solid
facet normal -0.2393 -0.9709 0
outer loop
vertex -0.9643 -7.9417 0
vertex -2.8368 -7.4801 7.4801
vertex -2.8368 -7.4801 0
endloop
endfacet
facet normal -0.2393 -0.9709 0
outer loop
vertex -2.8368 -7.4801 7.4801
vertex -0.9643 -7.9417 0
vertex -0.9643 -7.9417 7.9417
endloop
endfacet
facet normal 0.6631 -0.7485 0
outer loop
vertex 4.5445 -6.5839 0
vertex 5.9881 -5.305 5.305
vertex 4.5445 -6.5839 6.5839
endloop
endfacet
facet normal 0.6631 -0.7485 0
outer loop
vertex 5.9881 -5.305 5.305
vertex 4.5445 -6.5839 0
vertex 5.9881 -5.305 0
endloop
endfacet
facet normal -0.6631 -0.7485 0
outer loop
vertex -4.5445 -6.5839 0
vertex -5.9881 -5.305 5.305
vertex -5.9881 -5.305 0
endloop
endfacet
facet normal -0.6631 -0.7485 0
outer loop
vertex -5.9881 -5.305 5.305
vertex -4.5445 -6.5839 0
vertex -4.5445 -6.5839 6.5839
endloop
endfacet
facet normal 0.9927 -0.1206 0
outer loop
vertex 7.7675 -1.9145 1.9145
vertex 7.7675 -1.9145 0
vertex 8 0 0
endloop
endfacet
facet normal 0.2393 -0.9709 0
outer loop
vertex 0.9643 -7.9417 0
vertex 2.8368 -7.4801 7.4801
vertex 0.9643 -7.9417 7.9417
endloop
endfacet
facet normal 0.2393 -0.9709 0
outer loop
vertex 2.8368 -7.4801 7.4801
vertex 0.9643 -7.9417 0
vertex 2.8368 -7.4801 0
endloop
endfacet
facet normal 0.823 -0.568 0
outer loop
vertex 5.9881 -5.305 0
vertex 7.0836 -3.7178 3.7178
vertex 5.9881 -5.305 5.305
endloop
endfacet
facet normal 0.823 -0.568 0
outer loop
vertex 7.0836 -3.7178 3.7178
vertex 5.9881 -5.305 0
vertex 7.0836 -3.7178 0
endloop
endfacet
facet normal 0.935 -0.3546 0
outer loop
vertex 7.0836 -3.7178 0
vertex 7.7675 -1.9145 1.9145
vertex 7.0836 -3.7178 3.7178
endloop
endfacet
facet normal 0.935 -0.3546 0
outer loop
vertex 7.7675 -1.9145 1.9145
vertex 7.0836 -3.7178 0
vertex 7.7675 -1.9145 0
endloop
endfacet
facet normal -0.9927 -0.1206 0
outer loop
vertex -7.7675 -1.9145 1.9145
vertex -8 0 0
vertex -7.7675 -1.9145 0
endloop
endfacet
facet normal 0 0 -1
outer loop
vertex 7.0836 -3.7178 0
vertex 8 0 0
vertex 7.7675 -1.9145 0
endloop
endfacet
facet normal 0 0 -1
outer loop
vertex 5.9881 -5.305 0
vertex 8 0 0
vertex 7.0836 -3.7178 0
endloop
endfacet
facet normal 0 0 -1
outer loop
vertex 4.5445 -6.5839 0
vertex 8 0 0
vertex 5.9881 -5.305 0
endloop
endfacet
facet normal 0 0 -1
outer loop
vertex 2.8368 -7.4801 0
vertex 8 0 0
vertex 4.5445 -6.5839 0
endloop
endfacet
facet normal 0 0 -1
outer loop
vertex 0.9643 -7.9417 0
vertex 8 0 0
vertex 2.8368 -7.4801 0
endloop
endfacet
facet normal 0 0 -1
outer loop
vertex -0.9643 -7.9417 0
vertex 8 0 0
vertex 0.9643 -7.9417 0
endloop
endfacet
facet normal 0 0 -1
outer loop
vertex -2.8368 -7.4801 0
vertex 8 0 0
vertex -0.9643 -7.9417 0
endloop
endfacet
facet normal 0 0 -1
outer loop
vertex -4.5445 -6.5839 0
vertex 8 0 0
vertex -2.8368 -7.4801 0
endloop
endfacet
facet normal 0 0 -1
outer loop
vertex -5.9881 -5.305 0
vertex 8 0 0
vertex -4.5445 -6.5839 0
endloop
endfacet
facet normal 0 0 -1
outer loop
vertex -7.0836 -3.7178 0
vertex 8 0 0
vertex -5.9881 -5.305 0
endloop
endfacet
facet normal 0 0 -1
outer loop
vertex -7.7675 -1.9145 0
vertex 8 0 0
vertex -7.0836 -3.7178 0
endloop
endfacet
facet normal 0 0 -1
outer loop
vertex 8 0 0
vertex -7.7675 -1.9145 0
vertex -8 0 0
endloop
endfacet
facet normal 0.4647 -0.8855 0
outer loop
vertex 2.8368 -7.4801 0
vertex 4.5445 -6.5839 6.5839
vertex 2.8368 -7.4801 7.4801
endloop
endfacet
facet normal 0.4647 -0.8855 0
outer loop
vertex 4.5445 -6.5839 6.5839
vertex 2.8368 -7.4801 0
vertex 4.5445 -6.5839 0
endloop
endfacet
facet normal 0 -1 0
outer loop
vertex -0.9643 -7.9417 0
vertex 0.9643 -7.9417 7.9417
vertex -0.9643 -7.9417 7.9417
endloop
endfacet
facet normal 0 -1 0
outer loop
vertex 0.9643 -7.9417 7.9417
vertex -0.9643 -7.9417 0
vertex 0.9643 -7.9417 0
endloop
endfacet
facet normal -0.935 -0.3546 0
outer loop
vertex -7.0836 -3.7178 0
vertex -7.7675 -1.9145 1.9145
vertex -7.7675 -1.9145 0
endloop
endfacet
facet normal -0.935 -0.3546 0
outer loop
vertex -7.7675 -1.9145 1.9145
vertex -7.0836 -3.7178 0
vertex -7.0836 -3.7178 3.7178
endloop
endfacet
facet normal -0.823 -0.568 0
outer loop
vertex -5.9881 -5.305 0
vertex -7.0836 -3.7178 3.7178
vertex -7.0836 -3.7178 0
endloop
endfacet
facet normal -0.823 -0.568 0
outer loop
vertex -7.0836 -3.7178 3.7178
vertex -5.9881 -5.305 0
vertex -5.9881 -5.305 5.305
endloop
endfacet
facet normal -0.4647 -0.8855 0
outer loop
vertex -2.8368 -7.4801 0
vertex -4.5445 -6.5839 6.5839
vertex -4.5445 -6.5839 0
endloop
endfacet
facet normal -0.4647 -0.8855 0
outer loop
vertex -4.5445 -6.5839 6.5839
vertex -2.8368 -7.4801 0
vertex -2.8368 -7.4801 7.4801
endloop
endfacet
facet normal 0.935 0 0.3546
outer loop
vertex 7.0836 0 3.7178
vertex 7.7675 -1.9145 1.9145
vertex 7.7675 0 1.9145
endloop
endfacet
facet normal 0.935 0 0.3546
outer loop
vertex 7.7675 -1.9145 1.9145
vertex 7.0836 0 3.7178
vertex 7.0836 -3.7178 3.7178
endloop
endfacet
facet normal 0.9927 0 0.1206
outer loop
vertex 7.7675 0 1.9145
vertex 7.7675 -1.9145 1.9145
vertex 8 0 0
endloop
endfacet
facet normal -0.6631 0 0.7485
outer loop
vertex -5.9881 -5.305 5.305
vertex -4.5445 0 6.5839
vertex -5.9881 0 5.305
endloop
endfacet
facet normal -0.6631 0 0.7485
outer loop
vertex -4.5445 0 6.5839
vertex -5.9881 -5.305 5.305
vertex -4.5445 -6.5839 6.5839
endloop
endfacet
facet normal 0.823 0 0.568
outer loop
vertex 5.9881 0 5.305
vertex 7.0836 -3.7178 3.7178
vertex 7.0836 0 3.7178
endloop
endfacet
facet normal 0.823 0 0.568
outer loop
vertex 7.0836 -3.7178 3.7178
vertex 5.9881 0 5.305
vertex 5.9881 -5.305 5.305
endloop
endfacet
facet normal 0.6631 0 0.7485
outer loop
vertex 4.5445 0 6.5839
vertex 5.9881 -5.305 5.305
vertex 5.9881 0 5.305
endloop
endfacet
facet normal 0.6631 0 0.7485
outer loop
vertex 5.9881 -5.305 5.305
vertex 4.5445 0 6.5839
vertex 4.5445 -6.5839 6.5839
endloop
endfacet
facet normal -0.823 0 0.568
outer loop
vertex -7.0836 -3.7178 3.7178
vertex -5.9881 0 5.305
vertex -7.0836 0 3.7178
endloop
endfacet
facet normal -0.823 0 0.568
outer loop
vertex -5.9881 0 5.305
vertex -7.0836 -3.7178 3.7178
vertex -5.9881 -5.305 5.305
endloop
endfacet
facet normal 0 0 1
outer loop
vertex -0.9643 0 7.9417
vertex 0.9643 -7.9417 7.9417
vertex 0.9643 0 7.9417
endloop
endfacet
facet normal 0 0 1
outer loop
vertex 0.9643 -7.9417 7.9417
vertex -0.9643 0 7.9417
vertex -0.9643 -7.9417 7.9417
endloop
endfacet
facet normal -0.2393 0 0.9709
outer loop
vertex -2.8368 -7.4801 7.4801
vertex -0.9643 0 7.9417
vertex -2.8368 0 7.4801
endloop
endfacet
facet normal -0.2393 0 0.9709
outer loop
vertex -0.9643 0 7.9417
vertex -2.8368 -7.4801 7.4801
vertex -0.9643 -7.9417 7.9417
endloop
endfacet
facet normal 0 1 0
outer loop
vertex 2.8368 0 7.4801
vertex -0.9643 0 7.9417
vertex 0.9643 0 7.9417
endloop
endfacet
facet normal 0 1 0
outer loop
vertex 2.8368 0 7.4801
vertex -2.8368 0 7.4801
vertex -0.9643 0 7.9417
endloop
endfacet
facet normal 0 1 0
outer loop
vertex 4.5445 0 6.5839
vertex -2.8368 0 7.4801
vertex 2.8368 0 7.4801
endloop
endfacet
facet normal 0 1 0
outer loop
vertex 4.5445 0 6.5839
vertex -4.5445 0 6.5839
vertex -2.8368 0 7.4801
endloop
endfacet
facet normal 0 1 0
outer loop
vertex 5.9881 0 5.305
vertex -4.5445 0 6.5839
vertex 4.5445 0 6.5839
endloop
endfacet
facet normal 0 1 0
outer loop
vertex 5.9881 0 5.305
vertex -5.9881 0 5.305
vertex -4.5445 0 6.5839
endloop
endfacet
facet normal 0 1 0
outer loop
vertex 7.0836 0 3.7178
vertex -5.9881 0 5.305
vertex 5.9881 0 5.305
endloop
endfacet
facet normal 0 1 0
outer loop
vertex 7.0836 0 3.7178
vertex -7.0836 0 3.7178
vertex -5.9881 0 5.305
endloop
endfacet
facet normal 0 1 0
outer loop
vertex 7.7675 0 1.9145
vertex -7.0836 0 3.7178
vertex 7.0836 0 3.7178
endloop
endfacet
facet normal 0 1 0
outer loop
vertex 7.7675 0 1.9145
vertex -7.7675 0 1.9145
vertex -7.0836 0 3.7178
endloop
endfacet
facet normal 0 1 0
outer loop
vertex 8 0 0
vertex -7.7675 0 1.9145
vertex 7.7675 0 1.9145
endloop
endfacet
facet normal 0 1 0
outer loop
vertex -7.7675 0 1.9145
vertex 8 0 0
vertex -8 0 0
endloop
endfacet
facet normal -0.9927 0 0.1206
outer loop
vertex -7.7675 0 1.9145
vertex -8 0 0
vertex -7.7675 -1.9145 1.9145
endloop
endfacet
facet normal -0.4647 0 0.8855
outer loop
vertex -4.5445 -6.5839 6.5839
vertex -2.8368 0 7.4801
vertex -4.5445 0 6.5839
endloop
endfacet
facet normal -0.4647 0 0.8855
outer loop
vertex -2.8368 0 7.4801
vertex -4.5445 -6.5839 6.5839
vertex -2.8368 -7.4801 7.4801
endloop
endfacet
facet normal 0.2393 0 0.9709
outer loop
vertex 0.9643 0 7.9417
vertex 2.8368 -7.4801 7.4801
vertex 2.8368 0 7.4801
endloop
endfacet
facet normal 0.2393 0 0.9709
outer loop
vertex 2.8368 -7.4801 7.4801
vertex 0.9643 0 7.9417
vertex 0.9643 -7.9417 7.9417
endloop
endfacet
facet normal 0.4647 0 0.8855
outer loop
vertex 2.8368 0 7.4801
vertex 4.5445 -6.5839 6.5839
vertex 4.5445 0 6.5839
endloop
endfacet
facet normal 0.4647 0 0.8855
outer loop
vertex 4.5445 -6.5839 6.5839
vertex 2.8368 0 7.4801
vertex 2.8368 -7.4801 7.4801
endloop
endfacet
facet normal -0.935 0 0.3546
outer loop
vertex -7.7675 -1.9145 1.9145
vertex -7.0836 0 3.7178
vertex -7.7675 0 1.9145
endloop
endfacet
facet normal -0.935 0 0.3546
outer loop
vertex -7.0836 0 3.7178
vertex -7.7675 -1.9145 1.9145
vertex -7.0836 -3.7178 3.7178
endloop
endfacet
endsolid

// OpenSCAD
intersection() {
    cylinder(h = 20, r = 8);
    rotate([90, 0, 0]) cylinder(h = 20, r = 8);
}
